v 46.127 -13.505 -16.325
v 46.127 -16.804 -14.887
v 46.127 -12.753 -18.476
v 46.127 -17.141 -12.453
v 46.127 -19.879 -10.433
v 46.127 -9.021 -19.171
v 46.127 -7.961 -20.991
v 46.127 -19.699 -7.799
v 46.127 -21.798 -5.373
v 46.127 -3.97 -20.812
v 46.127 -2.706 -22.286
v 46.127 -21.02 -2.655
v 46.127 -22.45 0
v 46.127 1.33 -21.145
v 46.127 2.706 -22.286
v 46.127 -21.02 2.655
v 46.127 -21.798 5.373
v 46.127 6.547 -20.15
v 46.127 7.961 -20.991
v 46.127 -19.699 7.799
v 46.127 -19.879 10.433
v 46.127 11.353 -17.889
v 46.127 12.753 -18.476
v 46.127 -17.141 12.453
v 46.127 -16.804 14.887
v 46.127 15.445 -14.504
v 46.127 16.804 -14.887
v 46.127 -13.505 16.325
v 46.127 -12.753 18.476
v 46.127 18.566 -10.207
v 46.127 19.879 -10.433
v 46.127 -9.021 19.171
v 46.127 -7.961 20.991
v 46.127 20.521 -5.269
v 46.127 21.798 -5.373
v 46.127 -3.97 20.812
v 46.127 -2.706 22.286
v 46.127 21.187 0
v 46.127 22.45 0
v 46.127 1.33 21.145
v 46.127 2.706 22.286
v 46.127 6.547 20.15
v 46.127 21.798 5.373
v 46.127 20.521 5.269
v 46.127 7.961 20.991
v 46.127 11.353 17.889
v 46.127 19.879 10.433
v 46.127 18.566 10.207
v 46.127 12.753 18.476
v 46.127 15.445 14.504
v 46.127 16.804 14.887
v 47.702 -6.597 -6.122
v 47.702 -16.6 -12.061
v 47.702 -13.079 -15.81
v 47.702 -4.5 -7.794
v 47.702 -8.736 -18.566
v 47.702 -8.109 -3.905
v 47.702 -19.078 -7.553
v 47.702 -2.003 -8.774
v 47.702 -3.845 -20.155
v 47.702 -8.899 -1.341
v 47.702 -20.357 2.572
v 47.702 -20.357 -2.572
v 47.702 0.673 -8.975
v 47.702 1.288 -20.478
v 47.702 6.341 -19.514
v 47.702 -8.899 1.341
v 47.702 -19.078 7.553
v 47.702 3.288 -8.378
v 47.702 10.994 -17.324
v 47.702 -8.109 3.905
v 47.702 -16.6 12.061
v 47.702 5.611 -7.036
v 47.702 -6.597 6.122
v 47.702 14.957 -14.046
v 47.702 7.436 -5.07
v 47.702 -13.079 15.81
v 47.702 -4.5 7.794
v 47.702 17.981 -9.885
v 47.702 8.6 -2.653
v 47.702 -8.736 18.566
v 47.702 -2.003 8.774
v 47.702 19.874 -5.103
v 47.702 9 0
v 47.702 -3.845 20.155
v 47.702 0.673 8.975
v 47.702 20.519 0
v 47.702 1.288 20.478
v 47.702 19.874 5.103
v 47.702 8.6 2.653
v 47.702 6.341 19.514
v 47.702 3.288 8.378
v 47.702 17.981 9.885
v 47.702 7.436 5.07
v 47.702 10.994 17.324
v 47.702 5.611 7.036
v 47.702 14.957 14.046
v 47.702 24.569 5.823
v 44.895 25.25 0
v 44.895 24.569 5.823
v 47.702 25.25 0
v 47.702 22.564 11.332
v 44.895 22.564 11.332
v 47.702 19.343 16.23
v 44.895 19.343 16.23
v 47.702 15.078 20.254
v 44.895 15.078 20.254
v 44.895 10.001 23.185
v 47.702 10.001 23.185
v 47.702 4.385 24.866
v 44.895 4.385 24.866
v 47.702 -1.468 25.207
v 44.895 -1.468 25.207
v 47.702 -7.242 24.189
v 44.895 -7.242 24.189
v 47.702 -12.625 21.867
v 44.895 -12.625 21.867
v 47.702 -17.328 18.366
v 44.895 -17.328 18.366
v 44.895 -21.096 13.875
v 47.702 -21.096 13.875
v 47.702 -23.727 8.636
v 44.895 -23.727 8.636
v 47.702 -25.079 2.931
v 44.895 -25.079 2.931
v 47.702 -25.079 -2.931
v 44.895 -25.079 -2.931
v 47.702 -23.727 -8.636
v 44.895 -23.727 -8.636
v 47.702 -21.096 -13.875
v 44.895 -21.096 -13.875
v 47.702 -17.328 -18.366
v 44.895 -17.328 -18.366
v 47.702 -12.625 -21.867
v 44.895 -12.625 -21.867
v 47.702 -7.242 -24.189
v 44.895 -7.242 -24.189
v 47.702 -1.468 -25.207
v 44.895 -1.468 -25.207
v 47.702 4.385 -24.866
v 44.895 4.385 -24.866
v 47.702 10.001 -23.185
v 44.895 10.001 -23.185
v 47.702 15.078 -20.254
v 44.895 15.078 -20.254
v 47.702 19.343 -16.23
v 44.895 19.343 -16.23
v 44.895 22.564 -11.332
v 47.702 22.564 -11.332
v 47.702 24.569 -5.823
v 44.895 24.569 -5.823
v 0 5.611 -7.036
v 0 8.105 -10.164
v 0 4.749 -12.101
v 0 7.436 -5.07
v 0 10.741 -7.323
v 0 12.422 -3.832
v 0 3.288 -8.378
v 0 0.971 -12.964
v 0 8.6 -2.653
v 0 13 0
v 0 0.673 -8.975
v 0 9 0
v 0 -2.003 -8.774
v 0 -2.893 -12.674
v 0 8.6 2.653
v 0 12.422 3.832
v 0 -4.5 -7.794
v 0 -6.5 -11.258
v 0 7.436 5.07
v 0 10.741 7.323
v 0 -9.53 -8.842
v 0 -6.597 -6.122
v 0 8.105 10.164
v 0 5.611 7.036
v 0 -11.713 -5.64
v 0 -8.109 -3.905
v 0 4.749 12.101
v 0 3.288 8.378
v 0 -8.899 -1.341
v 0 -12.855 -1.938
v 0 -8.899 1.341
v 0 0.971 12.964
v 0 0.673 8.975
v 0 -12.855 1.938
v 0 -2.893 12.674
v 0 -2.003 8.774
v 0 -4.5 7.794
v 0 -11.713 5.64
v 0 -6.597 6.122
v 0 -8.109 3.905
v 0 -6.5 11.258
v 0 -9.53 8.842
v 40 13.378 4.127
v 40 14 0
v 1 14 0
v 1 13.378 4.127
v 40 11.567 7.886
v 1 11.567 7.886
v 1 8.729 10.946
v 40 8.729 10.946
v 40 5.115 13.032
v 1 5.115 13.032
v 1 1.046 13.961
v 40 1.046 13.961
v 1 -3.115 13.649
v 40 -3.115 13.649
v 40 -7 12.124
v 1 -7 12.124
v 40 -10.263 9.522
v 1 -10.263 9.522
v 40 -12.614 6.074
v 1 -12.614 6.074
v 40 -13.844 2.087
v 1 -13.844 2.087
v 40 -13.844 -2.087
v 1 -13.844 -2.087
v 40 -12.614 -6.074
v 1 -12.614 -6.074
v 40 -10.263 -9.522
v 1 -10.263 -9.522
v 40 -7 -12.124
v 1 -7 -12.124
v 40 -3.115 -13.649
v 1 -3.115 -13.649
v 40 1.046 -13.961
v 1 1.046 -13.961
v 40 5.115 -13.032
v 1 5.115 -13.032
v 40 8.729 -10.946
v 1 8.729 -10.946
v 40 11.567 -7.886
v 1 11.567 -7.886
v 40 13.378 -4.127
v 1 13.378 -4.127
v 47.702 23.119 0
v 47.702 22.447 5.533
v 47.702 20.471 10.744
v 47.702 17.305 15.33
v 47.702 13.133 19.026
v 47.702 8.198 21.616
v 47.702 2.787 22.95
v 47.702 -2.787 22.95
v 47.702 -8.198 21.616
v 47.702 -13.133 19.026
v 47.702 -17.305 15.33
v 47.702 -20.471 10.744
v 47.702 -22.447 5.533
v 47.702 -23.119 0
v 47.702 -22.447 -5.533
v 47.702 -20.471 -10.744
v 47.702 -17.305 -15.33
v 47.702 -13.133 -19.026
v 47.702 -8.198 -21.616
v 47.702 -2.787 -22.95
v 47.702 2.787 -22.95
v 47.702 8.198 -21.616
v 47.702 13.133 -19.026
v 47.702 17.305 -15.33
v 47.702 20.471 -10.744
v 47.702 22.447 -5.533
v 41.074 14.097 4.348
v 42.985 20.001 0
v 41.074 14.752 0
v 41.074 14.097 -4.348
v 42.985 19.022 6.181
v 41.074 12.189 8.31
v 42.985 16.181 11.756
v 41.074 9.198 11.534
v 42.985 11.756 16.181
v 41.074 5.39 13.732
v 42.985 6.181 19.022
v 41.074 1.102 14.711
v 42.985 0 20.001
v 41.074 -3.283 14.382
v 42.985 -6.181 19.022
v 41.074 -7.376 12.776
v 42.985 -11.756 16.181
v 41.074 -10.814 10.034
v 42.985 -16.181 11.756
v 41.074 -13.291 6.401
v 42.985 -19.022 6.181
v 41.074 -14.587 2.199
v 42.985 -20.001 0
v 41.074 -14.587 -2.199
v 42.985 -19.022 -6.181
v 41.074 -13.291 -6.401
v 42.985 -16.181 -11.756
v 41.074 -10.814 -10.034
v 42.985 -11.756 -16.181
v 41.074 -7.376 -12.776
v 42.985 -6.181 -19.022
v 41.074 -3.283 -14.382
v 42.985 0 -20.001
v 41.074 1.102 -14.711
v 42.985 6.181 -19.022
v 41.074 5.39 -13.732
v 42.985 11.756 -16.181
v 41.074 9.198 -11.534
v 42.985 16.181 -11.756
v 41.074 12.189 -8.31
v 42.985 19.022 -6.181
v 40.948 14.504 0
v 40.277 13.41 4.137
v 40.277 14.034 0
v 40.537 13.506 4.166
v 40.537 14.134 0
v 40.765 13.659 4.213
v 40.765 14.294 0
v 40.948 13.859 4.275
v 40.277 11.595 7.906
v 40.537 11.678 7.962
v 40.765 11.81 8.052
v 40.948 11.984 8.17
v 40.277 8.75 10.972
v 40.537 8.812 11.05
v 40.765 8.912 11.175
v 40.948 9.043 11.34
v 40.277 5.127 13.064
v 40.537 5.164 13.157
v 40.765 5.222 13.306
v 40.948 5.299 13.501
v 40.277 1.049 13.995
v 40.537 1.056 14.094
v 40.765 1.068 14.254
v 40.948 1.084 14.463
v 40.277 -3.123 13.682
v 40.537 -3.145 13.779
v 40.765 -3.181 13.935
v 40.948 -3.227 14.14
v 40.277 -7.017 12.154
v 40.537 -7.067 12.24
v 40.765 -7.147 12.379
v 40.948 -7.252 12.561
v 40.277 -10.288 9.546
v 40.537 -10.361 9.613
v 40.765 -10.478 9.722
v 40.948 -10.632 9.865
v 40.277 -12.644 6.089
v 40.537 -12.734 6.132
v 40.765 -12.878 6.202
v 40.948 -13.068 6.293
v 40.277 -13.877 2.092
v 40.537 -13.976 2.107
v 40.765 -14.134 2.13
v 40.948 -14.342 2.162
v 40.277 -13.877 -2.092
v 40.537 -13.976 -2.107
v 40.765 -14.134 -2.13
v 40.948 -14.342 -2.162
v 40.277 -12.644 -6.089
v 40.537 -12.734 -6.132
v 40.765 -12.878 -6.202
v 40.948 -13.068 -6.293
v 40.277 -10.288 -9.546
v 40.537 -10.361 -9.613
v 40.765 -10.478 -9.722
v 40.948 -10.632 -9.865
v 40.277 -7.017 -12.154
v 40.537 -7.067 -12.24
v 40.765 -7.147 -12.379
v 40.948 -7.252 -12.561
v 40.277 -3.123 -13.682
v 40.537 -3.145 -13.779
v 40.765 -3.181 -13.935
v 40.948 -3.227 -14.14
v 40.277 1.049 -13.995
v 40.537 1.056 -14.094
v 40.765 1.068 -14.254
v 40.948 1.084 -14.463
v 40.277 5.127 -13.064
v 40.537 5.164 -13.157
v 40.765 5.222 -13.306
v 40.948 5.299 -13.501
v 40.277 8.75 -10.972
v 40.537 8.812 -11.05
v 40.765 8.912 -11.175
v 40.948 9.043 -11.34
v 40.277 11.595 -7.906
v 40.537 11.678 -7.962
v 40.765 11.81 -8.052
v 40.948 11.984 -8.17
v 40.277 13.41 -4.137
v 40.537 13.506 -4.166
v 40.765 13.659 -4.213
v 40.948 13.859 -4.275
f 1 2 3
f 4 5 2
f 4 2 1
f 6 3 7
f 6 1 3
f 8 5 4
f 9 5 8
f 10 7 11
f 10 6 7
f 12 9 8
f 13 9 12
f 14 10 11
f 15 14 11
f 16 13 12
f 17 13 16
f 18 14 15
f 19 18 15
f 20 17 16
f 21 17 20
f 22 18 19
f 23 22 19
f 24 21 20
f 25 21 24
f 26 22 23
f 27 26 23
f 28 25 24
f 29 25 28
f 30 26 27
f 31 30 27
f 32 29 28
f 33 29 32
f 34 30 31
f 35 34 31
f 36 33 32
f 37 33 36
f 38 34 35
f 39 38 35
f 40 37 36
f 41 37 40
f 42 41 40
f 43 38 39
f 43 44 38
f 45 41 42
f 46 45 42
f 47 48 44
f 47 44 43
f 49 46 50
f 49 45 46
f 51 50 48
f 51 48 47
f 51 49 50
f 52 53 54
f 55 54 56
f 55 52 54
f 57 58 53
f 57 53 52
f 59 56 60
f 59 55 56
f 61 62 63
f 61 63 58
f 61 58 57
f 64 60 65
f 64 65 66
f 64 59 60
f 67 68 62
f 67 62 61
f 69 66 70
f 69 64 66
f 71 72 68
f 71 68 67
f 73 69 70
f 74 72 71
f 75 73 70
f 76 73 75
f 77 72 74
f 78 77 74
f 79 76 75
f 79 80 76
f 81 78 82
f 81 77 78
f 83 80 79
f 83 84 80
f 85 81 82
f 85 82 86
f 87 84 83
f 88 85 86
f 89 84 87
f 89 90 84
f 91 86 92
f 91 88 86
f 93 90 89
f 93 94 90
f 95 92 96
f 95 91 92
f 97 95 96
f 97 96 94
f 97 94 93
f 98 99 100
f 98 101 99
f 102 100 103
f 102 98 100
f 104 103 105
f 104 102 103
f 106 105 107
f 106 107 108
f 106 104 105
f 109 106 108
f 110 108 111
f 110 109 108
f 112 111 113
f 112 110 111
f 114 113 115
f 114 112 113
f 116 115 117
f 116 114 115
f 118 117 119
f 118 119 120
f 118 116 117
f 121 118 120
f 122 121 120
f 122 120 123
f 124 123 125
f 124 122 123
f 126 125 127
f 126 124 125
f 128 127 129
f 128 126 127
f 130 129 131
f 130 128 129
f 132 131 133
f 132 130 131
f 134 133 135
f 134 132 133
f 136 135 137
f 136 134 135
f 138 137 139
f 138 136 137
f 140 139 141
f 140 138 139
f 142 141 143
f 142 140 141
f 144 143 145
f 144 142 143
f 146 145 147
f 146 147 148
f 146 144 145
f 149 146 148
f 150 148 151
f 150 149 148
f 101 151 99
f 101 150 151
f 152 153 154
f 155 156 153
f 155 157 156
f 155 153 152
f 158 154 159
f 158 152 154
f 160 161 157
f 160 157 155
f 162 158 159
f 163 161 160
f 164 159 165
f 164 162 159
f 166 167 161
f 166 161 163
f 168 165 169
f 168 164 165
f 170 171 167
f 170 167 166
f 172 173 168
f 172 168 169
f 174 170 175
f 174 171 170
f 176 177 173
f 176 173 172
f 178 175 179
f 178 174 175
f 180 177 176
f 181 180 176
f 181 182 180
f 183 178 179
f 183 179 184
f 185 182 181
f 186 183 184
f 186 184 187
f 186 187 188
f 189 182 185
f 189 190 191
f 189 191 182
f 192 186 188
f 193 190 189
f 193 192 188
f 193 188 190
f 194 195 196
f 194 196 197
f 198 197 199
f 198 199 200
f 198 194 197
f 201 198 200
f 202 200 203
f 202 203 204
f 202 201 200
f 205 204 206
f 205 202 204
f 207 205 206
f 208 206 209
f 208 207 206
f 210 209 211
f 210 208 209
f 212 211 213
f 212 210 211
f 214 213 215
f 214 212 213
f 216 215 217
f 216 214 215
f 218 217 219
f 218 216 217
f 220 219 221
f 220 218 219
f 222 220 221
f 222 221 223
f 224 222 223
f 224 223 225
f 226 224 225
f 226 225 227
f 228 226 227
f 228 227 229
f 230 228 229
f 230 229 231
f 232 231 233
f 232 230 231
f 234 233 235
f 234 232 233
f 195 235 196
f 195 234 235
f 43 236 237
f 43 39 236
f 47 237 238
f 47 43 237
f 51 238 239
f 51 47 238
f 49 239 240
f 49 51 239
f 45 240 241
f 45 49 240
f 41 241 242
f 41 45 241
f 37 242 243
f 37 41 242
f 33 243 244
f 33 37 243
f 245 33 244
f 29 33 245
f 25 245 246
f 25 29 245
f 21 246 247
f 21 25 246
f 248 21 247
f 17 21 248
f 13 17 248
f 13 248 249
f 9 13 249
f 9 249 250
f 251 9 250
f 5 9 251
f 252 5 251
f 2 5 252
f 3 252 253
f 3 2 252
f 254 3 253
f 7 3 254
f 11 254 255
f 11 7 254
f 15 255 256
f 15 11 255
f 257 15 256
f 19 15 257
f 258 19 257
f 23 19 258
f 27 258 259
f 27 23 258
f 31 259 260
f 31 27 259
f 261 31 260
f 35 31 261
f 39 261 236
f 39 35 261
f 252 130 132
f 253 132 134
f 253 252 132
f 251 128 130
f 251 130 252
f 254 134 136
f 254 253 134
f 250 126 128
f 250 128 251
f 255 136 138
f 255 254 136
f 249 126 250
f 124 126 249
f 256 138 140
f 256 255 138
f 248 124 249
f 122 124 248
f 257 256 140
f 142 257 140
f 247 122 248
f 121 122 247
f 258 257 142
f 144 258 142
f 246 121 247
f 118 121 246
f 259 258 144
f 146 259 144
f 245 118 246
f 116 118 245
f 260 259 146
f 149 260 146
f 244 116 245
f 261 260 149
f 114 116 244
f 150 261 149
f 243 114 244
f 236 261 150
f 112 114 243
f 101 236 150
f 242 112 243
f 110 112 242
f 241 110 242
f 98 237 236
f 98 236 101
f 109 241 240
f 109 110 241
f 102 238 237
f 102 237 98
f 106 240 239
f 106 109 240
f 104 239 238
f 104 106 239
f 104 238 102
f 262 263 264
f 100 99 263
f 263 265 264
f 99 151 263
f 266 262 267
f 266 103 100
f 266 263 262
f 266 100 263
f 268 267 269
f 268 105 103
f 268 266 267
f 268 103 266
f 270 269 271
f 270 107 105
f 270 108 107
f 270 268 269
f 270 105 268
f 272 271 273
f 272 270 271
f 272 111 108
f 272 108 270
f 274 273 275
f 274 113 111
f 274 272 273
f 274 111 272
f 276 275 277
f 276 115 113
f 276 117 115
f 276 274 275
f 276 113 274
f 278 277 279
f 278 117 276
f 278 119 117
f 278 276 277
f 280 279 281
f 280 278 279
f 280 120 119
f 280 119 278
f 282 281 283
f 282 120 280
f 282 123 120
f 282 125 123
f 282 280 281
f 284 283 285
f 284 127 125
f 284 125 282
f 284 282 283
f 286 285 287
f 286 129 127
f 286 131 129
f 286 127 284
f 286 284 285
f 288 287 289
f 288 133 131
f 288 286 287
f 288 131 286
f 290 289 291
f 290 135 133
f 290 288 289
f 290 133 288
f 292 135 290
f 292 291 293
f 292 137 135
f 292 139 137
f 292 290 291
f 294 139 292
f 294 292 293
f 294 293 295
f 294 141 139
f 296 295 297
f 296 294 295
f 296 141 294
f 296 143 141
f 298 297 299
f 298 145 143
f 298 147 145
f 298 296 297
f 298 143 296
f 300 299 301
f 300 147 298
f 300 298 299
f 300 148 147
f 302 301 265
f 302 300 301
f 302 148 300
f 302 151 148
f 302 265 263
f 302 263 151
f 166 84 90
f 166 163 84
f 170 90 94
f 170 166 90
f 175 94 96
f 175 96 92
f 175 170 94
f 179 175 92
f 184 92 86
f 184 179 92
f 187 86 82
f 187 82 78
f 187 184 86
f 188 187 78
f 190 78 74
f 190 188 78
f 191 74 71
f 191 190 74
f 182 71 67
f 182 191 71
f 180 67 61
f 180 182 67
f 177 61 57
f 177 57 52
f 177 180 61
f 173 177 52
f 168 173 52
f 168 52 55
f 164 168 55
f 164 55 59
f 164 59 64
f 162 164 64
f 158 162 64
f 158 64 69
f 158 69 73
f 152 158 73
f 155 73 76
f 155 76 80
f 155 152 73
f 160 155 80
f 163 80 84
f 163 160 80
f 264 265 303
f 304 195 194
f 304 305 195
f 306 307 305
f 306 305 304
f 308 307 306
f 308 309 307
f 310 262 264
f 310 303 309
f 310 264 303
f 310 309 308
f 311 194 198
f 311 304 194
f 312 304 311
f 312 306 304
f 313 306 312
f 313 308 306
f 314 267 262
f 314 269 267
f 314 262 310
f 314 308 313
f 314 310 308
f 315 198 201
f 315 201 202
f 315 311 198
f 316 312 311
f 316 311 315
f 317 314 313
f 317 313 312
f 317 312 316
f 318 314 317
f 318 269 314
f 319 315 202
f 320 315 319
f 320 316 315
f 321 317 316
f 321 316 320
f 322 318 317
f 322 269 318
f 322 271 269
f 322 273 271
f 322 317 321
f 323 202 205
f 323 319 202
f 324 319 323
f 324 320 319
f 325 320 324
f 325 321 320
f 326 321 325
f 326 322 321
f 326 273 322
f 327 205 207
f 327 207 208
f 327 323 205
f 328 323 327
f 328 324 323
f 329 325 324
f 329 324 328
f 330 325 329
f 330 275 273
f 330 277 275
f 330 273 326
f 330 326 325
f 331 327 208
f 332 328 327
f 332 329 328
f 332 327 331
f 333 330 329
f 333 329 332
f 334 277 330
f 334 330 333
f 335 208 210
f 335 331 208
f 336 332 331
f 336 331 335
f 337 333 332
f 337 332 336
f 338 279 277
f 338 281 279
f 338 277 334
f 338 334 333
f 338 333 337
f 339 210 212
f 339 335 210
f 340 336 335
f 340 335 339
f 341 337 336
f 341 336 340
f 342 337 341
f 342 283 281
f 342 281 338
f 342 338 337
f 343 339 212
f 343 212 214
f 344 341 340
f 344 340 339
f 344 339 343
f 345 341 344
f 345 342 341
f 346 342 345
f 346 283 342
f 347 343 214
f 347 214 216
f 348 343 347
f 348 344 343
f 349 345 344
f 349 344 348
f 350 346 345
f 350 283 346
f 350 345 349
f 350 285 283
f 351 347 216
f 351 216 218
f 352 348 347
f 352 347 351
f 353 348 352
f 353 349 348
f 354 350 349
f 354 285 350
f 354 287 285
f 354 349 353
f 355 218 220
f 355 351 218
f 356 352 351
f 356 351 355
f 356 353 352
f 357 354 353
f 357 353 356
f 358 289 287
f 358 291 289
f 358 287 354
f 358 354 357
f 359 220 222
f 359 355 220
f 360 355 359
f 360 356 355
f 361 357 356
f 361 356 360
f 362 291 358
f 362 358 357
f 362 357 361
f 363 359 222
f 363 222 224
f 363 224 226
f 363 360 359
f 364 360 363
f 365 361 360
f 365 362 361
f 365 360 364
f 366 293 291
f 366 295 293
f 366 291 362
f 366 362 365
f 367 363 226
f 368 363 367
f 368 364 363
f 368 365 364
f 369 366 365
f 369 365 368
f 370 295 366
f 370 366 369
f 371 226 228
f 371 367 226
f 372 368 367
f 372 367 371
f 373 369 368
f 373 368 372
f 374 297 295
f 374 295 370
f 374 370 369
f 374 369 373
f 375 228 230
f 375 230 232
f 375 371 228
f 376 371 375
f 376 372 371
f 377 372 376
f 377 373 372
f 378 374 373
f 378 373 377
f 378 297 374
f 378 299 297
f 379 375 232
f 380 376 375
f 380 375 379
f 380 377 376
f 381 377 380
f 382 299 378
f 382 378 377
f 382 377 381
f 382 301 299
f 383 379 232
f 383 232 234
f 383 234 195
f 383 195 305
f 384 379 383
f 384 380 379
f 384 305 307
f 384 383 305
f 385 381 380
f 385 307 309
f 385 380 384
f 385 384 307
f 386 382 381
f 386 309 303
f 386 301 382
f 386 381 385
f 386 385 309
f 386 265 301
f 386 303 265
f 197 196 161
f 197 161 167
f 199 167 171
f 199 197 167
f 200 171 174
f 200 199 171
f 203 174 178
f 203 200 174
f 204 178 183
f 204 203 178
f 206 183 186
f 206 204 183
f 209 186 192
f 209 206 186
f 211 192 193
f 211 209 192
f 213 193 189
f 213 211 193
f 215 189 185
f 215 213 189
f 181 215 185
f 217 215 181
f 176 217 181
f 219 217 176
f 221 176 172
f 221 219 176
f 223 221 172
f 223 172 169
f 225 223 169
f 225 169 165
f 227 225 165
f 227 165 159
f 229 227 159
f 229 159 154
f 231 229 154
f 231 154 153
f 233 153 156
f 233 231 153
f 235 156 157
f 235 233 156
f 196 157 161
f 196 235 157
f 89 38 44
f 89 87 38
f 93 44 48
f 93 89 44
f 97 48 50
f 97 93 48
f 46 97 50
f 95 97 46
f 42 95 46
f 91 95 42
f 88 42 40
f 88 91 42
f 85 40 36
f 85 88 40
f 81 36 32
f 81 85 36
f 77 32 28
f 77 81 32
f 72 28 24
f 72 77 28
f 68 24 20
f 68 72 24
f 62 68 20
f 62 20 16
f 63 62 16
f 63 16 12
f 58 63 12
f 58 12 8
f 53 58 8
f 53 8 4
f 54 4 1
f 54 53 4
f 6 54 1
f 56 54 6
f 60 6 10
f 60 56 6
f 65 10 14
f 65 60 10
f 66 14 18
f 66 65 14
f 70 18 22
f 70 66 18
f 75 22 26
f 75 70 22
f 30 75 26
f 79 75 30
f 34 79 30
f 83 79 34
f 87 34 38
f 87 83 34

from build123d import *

# Parameters (mm, degrees)
CHAMFER3_SIZE = 1


with BuildPart() as part:
    # Sketch1 → Revolve1 (revolve)
    with BuildSketch(Plane.XY):
        with BuildLine():
            Line((41.074068666, 14.752070976), (44.895002352, 25.25))
            Line((44.895002352, 25.25), (47.701702352, 25.25))
            Line((47.701702352, 25.25), (47.701702352, 23.1186))
            Line((47.701702352, 23.1186), (46.126902352, 22.450137059))
            Line((46.126902352, 22.450137059), (46.126902352, 21.187062941))
            Line((46.126902352, 21.187062941), (47.701702352, 20.5186))
            Line((47.701702352, 20.5186), (47.701702352, 9))
            Line((47.701702352, 9), (0, 9))
            Line((0, 9), (0, 14))
            Line((0, 14), (40, 14))
            ThreePointArc((40, 14), (40.655597867, 14.206709213), (41.074068666, 14.752070976))
        make_face()
    revolve(axis=Axis((0, 0, 0), (1, 0, 0)))

    # Chamfer3
    chamfer3_edges = [part.edges().sort_by_distance(p)[0] for p in [
        (0, -14, 0),
    ]]
    chamfer(chamfer3_edges, length=CHAMFER3_SIZE)


solid = part.part
